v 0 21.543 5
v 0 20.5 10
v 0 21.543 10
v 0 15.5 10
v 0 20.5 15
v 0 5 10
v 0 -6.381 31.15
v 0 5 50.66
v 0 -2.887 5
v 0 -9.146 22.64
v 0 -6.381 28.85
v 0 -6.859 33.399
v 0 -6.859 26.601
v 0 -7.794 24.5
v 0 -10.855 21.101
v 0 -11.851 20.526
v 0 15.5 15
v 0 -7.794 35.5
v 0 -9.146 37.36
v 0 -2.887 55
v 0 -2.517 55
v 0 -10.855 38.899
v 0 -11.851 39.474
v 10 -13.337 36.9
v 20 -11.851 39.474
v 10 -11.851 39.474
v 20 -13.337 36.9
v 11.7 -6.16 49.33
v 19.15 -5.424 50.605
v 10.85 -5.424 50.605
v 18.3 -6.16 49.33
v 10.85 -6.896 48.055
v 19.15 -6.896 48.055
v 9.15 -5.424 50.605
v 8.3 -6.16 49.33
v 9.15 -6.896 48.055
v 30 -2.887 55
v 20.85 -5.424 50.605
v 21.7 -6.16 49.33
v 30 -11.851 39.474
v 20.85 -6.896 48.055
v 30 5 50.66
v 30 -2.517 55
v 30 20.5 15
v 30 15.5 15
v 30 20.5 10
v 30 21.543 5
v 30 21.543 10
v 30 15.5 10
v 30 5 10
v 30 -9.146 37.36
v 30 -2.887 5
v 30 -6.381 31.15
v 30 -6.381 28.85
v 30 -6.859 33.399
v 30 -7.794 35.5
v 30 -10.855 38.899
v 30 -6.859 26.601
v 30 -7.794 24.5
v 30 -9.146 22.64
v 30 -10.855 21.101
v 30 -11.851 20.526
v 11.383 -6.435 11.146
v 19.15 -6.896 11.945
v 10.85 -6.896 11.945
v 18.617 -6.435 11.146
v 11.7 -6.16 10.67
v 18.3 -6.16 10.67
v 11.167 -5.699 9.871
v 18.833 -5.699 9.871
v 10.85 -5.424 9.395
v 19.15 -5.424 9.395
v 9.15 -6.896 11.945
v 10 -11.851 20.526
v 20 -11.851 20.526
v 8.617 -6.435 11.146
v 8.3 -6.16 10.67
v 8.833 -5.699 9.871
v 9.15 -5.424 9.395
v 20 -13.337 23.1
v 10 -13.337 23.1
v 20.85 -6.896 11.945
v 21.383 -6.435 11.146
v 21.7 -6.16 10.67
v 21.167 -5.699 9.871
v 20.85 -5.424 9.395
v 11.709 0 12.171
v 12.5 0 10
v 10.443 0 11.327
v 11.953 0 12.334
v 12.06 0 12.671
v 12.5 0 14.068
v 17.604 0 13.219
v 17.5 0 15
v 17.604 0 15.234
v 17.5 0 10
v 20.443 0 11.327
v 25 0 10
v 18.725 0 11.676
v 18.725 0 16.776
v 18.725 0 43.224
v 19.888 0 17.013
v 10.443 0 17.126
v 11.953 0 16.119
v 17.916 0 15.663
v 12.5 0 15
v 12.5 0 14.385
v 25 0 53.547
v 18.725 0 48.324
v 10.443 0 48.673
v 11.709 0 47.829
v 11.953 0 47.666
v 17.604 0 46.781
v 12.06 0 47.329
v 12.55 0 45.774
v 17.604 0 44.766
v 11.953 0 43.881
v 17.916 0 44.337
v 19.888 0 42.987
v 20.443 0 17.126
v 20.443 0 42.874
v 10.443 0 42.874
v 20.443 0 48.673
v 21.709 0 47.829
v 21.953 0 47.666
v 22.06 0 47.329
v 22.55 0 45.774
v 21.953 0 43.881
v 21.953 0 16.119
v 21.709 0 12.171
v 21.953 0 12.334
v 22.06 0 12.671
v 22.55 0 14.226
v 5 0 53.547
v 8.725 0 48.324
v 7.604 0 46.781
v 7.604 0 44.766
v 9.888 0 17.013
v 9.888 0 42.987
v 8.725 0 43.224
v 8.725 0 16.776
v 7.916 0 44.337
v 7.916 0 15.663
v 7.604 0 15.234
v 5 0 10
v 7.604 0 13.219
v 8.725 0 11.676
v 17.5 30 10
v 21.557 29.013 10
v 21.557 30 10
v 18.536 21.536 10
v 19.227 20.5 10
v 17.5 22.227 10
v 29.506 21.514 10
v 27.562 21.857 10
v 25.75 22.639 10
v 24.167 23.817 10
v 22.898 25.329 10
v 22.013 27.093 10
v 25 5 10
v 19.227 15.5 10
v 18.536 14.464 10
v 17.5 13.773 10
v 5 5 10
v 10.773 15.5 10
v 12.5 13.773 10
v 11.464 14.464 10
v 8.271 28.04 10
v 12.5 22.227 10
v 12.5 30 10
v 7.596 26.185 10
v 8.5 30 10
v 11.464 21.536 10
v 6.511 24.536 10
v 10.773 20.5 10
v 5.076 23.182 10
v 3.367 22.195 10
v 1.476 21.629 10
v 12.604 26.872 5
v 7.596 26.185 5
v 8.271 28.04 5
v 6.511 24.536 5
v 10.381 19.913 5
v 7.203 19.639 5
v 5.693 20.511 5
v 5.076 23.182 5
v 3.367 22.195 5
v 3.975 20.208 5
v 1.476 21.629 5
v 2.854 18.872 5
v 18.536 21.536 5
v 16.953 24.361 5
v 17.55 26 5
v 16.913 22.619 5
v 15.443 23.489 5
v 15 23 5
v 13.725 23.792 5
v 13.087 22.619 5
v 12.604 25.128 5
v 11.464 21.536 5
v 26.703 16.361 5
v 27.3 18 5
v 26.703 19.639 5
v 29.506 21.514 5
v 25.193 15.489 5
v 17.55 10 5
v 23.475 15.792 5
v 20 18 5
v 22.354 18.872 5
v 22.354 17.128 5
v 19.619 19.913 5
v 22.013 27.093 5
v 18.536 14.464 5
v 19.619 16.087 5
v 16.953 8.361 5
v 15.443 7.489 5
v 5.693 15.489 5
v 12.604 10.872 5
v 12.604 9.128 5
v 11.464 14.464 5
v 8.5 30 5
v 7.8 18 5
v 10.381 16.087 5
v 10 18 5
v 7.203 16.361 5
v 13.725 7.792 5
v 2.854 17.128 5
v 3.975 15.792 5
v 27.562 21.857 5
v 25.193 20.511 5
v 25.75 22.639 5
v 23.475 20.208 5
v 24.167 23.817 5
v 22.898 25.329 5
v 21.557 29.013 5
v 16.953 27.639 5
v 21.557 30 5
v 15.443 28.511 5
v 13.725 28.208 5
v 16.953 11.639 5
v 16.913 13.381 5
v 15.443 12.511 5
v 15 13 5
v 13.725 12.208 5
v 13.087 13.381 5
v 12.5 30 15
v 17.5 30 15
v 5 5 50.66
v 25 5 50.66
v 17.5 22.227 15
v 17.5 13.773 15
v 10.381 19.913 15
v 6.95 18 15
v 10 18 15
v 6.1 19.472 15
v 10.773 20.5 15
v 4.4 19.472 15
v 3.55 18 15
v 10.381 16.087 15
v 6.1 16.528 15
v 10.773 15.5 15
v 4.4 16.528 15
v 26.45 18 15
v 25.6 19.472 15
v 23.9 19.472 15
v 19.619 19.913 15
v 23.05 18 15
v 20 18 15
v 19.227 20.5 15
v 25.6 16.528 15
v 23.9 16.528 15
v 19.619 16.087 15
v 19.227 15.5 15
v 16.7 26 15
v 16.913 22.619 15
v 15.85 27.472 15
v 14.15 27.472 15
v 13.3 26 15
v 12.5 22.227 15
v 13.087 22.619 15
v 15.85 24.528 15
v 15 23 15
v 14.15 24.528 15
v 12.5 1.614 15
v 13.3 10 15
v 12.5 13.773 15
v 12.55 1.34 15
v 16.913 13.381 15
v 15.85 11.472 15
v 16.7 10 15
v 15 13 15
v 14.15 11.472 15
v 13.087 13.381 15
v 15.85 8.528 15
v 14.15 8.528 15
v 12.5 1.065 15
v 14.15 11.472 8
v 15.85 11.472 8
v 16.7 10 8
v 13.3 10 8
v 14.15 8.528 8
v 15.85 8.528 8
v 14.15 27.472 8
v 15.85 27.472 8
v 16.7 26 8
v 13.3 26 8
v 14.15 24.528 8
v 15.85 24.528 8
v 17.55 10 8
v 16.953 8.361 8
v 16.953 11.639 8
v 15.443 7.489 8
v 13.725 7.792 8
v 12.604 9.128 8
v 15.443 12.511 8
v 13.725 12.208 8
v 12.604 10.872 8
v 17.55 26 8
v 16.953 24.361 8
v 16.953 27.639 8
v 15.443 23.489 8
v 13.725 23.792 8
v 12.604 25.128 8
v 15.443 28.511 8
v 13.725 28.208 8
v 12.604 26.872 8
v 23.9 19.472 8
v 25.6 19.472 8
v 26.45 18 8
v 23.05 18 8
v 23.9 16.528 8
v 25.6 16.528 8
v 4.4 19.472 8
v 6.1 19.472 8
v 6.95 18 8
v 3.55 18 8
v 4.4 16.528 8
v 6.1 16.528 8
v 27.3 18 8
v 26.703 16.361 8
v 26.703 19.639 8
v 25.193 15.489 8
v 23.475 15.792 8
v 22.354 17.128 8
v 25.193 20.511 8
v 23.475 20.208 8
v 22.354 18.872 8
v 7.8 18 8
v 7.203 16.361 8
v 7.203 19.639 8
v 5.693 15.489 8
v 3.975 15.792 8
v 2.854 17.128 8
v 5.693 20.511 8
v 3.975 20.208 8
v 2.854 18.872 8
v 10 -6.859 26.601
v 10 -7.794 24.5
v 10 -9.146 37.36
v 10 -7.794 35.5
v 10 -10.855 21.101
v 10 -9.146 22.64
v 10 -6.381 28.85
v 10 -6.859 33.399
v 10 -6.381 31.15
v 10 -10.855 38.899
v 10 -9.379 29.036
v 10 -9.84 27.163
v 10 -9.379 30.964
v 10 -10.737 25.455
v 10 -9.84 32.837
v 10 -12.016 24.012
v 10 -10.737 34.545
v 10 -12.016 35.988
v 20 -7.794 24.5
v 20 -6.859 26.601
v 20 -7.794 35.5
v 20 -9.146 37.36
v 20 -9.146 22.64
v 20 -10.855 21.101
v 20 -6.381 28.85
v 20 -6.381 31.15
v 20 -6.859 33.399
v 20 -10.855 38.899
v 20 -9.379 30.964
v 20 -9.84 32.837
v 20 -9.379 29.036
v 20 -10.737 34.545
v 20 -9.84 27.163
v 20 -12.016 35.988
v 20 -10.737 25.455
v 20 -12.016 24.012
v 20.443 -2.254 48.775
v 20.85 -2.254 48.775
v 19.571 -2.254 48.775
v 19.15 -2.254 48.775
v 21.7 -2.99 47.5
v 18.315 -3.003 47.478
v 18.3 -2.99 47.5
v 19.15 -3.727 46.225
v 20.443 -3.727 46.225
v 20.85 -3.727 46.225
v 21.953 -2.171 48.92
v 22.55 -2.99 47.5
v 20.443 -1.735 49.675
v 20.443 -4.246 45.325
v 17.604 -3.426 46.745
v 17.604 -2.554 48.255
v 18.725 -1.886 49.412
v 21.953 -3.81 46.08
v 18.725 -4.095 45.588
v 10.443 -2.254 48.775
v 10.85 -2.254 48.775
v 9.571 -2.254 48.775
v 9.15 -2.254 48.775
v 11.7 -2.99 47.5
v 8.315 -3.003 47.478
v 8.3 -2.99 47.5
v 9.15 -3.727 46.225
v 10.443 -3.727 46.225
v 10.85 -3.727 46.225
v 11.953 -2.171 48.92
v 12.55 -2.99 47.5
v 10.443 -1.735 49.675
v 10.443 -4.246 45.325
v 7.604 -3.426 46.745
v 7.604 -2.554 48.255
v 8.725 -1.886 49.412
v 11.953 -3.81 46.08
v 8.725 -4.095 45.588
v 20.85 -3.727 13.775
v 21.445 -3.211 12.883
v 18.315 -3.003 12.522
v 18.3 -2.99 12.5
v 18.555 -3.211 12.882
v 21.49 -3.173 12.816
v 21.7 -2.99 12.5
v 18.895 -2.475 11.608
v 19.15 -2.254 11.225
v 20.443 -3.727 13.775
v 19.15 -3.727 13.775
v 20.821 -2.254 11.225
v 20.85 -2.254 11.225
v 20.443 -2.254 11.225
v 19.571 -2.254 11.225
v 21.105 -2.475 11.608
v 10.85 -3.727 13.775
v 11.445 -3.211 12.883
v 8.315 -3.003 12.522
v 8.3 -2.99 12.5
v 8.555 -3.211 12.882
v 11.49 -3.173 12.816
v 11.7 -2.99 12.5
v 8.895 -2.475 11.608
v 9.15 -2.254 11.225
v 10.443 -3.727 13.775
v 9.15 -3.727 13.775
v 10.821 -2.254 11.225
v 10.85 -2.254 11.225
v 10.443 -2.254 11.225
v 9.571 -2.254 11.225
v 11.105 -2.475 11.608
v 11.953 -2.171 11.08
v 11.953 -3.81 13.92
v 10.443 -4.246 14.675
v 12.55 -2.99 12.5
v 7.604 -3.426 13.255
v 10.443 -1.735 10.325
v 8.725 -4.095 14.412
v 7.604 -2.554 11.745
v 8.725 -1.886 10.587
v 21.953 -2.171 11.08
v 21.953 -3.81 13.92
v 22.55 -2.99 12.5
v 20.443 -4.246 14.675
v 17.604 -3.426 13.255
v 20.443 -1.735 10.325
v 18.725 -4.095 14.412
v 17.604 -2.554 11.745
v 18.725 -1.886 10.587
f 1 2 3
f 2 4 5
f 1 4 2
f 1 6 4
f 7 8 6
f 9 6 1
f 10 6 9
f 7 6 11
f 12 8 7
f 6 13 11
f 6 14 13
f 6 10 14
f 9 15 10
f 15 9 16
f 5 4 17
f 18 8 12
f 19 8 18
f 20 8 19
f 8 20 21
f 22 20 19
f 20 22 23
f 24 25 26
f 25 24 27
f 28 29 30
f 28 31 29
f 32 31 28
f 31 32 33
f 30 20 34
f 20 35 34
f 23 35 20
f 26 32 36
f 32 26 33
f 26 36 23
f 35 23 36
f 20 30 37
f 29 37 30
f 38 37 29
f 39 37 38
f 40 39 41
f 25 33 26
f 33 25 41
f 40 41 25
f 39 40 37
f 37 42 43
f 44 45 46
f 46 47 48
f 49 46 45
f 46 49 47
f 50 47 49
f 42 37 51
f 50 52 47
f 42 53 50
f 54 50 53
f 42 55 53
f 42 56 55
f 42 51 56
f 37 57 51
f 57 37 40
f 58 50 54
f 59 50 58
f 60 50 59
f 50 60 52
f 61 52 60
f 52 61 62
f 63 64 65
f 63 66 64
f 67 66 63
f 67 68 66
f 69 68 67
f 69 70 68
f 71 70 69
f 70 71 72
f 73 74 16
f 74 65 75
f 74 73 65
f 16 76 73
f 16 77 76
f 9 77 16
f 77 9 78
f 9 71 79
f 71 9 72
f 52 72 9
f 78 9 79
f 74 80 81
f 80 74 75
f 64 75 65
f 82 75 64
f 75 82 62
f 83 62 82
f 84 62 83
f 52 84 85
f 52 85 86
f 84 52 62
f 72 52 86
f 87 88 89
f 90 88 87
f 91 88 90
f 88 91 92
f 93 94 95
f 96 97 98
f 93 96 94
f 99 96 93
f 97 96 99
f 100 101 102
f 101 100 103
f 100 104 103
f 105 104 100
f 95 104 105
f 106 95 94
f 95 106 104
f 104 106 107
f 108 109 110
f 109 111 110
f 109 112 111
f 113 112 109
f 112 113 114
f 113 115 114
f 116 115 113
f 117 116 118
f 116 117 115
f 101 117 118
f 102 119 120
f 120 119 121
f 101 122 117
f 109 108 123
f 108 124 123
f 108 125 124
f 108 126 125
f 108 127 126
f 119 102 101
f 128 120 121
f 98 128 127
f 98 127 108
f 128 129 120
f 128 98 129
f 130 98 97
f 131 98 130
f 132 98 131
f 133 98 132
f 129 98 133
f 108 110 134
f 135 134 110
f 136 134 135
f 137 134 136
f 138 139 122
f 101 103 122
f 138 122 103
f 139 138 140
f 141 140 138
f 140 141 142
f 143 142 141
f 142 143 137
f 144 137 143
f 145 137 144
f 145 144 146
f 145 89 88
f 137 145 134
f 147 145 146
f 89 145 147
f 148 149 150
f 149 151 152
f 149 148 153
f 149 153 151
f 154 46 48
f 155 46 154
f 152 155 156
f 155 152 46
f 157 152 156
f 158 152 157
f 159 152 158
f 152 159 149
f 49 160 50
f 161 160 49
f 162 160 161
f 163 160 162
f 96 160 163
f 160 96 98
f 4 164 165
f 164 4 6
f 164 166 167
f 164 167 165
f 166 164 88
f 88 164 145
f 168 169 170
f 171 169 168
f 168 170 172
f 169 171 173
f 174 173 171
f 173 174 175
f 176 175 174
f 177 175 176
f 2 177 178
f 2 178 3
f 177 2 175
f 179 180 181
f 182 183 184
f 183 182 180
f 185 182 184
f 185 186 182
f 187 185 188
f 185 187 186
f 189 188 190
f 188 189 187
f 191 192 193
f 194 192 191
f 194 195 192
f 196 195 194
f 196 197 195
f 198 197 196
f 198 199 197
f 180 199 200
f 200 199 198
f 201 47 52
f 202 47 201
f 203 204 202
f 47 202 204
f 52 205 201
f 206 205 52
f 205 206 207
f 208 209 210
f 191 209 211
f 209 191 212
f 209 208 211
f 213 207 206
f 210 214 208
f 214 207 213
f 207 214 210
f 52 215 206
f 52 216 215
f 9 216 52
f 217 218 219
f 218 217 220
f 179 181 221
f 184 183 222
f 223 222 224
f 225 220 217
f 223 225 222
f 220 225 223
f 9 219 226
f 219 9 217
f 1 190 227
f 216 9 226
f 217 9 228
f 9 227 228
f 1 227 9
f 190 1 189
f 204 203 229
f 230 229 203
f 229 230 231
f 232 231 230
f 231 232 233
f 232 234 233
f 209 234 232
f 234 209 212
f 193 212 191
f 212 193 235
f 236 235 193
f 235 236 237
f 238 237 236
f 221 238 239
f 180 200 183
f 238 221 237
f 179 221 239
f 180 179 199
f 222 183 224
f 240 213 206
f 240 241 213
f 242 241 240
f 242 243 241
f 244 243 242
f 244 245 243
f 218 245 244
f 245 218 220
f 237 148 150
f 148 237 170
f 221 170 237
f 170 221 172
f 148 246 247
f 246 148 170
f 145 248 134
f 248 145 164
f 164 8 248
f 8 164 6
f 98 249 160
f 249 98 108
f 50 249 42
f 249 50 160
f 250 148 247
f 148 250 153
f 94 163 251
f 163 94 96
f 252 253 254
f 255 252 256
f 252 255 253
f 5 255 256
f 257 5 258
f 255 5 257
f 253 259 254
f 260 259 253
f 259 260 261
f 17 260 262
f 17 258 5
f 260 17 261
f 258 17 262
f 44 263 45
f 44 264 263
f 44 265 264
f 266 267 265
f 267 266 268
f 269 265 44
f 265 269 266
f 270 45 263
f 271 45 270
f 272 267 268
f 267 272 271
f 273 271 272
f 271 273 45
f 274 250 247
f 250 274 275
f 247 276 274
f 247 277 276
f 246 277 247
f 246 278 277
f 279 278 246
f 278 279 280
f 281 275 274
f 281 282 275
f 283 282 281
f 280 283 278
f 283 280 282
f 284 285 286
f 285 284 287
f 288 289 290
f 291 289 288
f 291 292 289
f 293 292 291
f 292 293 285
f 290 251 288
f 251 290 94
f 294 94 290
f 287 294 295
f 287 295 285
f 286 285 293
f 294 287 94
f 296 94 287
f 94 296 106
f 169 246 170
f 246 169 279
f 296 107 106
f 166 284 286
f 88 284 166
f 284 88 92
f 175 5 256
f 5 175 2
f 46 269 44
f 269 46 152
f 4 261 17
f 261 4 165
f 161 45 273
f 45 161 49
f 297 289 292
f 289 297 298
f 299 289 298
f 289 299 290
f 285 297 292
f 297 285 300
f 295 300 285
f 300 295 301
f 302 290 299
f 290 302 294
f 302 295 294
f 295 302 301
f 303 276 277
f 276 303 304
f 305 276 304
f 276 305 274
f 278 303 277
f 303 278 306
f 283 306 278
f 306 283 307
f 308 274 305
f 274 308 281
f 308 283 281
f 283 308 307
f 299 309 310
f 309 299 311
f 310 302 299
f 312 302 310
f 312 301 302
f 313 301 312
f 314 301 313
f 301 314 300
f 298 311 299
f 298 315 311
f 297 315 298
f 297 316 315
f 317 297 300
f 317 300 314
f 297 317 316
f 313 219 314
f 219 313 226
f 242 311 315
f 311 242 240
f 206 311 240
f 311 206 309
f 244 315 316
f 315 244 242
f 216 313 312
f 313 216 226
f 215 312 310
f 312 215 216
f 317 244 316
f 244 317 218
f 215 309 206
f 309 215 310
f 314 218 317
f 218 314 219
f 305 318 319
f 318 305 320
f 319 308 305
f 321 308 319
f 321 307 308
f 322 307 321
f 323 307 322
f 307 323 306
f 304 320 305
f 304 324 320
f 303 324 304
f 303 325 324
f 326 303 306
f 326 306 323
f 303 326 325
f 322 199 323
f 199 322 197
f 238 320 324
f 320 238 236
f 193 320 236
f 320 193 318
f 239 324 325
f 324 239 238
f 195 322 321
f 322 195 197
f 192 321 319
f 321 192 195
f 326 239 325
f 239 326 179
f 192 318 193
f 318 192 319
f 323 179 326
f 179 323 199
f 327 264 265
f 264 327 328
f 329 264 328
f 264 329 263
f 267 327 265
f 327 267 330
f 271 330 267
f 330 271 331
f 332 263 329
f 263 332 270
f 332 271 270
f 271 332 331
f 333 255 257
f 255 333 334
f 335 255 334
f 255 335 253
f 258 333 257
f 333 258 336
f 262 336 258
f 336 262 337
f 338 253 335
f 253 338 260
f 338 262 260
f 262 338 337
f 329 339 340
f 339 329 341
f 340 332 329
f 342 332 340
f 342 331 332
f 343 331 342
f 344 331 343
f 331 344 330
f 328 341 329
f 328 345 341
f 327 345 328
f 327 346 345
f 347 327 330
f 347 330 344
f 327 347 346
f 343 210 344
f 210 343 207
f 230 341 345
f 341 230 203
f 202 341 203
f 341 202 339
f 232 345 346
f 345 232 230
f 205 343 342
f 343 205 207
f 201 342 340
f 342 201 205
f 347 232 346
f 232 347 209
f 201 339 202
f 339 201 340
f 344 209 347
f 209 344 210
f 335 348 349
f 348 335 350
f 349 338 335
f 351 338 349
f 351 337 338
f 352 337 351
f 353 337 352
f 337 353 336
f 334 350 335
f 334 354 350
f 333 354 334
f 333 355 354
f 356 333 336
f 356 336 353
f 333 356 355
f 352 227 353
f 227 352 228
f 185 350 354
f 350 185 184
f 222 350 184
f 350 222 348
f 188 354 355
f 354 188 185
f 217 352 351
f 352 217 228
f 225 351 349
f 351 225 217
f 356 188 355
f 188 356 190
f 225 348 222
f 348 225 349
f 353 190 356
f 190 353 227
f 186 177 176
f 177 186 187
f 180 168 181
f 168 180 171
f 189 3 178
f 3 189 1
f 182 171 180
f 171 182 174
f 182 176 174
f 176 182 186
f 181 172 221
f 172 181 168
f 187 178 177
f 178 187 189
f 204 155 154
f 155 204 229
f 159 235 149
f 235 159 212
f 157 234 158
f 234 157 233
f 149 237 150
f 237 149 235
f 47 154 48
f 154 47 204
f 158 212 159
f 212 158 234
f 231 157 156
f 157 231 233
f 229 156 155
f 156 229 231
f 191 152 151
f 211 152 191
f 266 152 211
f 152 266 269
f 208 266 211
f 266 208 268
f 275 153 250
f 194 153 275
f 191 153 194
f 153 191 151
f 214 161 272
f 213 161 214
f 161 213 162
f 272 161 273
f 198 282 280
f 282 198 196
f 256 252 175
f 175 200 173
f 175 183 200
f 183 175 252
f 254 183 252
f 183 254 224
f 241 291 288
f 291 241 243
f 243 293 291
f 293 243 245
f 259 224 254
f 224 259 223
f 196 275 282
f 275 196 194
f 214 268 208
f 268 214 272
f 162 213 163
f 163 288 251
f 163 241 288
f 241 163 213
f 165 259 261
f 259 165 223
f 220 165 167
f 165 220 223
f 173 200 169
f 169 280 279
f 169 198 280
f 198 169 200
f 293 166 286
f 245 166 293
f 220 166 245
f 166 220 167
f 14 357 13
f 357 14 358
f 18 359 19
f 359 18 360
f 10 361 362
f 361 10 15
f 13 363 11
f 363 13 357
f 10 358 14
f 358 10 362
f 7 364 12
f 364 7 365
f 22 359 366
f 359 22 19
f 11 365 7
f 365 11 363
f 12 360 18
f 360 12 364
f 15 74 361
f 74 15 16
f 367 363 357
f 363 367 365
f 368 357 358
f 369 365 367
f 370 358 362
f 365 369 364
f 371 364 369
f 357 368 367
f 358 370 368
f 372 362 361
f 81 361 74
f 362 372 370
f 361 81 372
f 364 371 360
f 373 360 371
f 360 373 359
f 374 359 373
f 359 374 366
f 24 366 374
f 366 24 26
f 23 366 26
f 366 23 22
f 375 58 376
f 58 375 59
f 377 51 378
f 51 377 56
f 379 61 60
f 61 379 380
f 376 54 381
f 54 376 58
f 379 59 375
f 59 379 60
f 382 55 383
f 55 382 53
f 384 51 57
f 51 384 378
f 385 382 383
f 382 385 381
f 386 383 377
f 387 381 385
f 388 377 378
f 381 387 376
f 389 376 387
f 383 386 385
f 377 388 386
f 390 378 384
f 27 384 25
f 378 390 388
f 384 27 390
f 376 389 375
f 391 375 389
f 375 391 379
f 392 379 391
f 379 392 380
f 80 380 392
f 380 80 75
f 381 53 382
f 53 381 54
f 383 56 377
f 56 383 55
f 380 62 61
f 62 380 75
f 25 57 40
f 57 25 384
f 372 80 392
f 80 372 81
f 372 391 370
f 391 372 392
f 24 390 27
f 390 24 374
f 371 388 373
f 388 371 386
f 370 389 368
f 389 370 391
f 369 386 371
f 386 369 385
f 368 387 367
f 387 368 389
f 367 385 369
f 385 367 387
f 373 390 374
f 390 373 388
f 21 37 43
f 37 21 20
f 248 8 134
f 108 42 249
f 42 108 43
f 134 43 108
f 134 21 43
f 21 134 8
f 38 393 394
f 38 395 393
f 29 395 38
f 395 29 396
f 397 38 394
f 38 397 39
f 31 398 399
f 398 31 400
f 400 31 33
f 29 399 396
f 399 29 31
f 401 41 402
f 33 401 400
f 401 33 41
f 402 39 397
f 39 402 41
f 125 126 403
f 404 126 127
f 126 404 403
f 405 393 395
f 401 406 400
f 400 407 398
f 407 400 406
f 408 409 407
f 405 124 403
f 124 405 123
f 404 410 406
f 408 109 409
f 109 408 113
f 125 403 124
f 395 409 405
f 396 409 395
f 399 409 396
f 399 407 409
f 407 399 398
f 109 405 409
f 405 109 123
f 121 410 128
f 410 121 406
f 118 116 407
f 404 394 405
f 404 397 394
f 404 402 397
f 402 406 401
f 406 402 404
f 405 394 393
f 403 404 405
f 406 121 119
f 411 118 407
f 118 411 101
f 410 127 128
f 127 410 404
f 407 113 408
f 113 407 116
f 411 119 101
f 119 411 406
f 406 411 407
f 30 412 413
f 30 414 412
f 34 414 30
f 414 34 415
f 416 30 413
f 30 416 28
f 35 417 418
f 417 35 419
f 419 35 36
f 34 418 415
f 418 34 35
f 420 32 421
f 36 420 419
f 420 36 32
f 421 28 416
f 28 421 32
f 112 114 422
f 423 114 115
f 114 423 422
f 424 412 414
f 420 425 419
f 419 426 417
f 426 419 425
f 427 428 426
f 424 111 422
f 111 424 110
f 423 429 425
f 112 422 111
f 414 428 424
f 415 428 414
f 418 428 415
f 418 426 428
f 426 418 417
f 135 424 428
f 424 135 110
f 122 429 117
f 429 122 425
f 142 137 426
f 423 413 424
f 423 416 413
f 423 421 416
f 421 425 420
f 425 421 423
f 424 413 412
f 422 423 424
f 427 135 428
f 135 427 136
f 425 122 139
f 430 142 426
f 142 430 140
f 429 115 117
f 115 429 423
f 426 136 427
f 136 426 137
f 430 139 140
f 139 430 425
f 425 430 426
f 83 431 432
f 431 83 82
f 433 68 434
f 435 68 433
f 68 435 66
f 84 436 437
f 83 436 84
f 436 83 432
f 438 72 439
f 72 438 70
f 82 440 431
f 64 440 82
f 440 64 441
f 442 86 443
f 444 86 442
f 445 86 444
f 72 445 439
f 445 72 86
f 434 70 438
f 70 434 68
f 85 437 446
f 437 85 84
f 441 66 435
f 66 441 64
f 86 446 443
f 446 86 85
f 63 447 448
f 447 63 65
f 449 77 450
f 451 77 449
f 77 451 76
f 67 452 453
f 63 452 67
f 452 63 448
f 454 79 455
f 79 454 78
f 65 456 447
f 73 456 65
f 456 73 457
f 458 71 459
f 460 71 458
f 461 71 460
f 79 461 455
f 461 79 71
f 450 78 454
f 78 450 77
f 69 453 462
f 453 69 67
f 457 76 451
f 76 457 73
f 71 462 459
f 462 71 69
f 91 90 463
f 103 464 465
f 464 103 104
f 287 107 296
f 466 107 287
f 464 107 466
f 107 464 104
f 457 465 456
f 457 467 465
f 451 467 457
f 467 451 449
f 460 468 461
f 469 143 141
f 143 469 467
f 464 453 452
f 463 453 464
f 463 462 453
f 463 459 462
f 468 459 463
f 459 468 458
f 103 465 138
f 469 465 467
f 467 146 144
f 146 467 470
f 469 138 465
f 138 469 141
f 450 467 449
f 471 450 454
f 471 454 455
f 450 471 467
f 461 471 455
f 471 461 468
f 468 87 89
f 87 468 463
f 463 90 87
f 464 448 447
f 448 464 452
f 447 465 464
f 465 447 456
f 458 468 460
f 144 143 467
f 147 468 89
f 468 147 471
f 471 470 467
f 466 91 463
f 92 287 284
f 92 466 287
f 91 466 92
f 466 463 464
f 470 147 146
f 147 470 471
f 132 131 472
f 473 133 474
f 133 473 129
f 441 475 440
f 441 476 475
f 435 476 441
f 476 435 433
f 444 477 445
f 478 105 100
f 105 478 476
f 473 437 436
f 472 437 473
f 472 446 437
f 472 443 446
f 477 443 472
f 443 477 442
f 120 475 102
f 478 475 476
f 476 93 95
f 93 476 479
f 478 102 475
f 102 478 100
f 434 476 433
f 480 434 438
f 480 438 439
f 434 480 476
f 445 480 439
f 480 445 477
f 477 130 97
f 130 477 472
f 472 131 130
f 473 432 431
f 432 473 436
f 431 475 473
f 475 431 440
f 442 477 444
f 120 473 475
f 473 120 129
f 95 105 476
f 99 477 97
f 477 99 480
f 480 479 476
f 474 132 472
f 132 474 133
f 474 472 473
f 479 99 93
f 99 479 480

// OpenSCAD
mountHeight = 60;
mountWidth = mountHeight/2;
mountDepth = tan(30)*mountWidth;
mountSize = mountWidth/6;
drillSize = 1.7;
gridUnit = mountWidth/3;

module strut() 
{   
    difference() {
        union() {
            translate([0, 0, 0])
                polyhedron(
                    points=[[0,0,0],[mountWidth,0,0], [mountWidth,0,mountHeight],[0,0,mountHeight],[0,-mountDepth,mountWidth], [mountWidth,-mountDepth,mountWidth]],
                    faces=[[0,4,3],[4,5,2,3],[1,2,5],[4,0,1,5],[0,3,2,1]], center = true
                );
            //translate([0, -mountSize, 5]) cube([mountWidth, mountSize, mountHeight]);
            translate([0, 0,5]) cube([mountWidth, mountWidth, mountSize]);
            
            // Frame supports
            translate([0, 0, mountSize+5]) cube([mountSize, mountSize, mountHeight]);
            translate([mountWidth-mountSize, 0, mountSize+5]) cube([mountSize, mountSize, mountHeight]);
            
            // Motor screw mounts
            translate([mountWidth/2, (mountWidth/2), 12.5]) cube([mountSize, mountWidth, mountSize], true);
            translate([mountWidth/2, 18, 12.5]) cube([mountWidth, mountSize, mountSize], true);
            
        }
        
        union() {

            /// Motor mount screw holes
            translate([mountWidth/2, 10, -mountSize/2]) cylinder(mountWidth, drillSize, drillSize);
            translate([mountWidth/2, 26, -mountSize/2]) cylinder(mountWidth, drillSize, drillSize);
            
            translate([mountWidth/2, 10, 3]) cylinder(5, drillSize*1.5, drillSize*1.5);
            translate([mountWidth/2, 26, 3]) cylinder(5, drillSize*1.5, drillSize*1.5);
            
            
            translate([(mountWidth/2)+9.75, 18, -mountSize/2]) cylinder(mountWidth, drillSize, drillSize);
            translate([(mountWidth/2)-9.75, 18, -mountSize/2]) cylinder(mountWidth, drillSize, drillSize);
            
            translate([(mountWidth/2)+9.75, 18, 3]) cylinder(5, drillSize*1.5, drillSize*1.5);
            translate([(mountWidth/2)-9.75, 18, 3]) cylinder(5  , drillSize*1.5, drillSize*1.5);
            
            
            // Cutaways
            translate([0, 30, -mountSize/2]) cylinder(mountWidth, drillSize*5, drillSize*5);
            translate([30, 30, -mountSize/2]) cylinder(mountWidth, drillSize*5, drillSize*5);
            
            // Rotary space
            translate([mountWidth/2, 18, -1]) cylinder(mountWidth, 5, 5);
            
            // Hollowing cube
            //translate([15, -5, 30]) cube([15, 50, 15], true);
            
            // Space for bearings
            translate([0, -mountDepth, mountHeight/2]) 
                rotate([0,90,0]) {
                    cylinder(mountWidth/3, 11, 11);
                }
                
            translate([20, -mountDepth, mountHeight/2]) 
                rotate([0,90,0]) {
                    cylinder(mountWidth/3, 11, 11);
                }
                
            // Space for Axle
            translate([0, -mountDepth, mountHeight/2]) 
                rotate([0,90,0]) {
                    cylinder(mountWidth+1, 8, 8);
                }
            
            // Flatten top
            translate([-1, -30, mountHeight-5]) 
                //rotate([0,0,0]) {
                    cube([mountWidth+2, mountHeight, mountHeight]);
                //}
            
            // Bevel top
            translate([-1, 20, mountHeight-18]) 
                rotate([60,0,0]) {
                    cube([mountWidth+2, mountHeight, mountHeight]);
                }
                
            // Flatten bottom
            translate([-1, -15, -10]) cube([mountWidth+2, mountWidth+20, 15]);
            
        }
        
        
        
        union() {
            
            ///  Frame fixtures
            
            // Through hole
            translate([gridUnit*2, gridUnit, gridUnit*4]) 
                rotate([60,0,0]) {  
                    cylinder(mountSize*10, drillSize, drillSize); 
                }
            
            // Head gap
            translate([gridUnit*2, gridUnit, gridUnit*4]) 
                rotate([60,0,0]) {  
                    cylinder(mountSize*3, drillSize*1.5, drillSize*1.5); 
                }
                
                
            translate([gridUnit, gridUnit, gridUnit*4]) 
                rotate([60,0,0]) {  
                    cylinder(mountSize*10, drillSize, drillSize); 
                } 
                
            translate([gridUnit, gridUnit, gridUnit*4]) 
                rotate([60,0,0]) {  
                    cylinder(mountSize*3, drillSize*1.5, drillSize*1.5); 
                }
            
            translate([gridUnit*2, gridUnit, gridUnit*2]) 
                rotate([120,0,0]) {  
                    cylinder(mountSize*10, drillSize, drillSize); 
                }
                
           translate([gridUnit, gridUnit, gridUnit*2]) 
                rotate([120,0,0]) {  
                    cylinder(mountSize*10, drillSize, drillSize); 
                }
                
            translate([gridUnit, gridUnit, gridUnit*2]) 
                rotate([120,0,0]) {  
                    cylinder(mountSize*3, drillSize*1.5, drillSize*1.5); 
                }
                
            translate([gridUnit*2, gridUnit, gridUnit*2]) 
                rotate([120,0,0]) {  
                    cylinder(mountSize*3, drillSize*1.5, drillSize*1.5); 
                }
        }
        
    }
    
           
    
}

strut();
